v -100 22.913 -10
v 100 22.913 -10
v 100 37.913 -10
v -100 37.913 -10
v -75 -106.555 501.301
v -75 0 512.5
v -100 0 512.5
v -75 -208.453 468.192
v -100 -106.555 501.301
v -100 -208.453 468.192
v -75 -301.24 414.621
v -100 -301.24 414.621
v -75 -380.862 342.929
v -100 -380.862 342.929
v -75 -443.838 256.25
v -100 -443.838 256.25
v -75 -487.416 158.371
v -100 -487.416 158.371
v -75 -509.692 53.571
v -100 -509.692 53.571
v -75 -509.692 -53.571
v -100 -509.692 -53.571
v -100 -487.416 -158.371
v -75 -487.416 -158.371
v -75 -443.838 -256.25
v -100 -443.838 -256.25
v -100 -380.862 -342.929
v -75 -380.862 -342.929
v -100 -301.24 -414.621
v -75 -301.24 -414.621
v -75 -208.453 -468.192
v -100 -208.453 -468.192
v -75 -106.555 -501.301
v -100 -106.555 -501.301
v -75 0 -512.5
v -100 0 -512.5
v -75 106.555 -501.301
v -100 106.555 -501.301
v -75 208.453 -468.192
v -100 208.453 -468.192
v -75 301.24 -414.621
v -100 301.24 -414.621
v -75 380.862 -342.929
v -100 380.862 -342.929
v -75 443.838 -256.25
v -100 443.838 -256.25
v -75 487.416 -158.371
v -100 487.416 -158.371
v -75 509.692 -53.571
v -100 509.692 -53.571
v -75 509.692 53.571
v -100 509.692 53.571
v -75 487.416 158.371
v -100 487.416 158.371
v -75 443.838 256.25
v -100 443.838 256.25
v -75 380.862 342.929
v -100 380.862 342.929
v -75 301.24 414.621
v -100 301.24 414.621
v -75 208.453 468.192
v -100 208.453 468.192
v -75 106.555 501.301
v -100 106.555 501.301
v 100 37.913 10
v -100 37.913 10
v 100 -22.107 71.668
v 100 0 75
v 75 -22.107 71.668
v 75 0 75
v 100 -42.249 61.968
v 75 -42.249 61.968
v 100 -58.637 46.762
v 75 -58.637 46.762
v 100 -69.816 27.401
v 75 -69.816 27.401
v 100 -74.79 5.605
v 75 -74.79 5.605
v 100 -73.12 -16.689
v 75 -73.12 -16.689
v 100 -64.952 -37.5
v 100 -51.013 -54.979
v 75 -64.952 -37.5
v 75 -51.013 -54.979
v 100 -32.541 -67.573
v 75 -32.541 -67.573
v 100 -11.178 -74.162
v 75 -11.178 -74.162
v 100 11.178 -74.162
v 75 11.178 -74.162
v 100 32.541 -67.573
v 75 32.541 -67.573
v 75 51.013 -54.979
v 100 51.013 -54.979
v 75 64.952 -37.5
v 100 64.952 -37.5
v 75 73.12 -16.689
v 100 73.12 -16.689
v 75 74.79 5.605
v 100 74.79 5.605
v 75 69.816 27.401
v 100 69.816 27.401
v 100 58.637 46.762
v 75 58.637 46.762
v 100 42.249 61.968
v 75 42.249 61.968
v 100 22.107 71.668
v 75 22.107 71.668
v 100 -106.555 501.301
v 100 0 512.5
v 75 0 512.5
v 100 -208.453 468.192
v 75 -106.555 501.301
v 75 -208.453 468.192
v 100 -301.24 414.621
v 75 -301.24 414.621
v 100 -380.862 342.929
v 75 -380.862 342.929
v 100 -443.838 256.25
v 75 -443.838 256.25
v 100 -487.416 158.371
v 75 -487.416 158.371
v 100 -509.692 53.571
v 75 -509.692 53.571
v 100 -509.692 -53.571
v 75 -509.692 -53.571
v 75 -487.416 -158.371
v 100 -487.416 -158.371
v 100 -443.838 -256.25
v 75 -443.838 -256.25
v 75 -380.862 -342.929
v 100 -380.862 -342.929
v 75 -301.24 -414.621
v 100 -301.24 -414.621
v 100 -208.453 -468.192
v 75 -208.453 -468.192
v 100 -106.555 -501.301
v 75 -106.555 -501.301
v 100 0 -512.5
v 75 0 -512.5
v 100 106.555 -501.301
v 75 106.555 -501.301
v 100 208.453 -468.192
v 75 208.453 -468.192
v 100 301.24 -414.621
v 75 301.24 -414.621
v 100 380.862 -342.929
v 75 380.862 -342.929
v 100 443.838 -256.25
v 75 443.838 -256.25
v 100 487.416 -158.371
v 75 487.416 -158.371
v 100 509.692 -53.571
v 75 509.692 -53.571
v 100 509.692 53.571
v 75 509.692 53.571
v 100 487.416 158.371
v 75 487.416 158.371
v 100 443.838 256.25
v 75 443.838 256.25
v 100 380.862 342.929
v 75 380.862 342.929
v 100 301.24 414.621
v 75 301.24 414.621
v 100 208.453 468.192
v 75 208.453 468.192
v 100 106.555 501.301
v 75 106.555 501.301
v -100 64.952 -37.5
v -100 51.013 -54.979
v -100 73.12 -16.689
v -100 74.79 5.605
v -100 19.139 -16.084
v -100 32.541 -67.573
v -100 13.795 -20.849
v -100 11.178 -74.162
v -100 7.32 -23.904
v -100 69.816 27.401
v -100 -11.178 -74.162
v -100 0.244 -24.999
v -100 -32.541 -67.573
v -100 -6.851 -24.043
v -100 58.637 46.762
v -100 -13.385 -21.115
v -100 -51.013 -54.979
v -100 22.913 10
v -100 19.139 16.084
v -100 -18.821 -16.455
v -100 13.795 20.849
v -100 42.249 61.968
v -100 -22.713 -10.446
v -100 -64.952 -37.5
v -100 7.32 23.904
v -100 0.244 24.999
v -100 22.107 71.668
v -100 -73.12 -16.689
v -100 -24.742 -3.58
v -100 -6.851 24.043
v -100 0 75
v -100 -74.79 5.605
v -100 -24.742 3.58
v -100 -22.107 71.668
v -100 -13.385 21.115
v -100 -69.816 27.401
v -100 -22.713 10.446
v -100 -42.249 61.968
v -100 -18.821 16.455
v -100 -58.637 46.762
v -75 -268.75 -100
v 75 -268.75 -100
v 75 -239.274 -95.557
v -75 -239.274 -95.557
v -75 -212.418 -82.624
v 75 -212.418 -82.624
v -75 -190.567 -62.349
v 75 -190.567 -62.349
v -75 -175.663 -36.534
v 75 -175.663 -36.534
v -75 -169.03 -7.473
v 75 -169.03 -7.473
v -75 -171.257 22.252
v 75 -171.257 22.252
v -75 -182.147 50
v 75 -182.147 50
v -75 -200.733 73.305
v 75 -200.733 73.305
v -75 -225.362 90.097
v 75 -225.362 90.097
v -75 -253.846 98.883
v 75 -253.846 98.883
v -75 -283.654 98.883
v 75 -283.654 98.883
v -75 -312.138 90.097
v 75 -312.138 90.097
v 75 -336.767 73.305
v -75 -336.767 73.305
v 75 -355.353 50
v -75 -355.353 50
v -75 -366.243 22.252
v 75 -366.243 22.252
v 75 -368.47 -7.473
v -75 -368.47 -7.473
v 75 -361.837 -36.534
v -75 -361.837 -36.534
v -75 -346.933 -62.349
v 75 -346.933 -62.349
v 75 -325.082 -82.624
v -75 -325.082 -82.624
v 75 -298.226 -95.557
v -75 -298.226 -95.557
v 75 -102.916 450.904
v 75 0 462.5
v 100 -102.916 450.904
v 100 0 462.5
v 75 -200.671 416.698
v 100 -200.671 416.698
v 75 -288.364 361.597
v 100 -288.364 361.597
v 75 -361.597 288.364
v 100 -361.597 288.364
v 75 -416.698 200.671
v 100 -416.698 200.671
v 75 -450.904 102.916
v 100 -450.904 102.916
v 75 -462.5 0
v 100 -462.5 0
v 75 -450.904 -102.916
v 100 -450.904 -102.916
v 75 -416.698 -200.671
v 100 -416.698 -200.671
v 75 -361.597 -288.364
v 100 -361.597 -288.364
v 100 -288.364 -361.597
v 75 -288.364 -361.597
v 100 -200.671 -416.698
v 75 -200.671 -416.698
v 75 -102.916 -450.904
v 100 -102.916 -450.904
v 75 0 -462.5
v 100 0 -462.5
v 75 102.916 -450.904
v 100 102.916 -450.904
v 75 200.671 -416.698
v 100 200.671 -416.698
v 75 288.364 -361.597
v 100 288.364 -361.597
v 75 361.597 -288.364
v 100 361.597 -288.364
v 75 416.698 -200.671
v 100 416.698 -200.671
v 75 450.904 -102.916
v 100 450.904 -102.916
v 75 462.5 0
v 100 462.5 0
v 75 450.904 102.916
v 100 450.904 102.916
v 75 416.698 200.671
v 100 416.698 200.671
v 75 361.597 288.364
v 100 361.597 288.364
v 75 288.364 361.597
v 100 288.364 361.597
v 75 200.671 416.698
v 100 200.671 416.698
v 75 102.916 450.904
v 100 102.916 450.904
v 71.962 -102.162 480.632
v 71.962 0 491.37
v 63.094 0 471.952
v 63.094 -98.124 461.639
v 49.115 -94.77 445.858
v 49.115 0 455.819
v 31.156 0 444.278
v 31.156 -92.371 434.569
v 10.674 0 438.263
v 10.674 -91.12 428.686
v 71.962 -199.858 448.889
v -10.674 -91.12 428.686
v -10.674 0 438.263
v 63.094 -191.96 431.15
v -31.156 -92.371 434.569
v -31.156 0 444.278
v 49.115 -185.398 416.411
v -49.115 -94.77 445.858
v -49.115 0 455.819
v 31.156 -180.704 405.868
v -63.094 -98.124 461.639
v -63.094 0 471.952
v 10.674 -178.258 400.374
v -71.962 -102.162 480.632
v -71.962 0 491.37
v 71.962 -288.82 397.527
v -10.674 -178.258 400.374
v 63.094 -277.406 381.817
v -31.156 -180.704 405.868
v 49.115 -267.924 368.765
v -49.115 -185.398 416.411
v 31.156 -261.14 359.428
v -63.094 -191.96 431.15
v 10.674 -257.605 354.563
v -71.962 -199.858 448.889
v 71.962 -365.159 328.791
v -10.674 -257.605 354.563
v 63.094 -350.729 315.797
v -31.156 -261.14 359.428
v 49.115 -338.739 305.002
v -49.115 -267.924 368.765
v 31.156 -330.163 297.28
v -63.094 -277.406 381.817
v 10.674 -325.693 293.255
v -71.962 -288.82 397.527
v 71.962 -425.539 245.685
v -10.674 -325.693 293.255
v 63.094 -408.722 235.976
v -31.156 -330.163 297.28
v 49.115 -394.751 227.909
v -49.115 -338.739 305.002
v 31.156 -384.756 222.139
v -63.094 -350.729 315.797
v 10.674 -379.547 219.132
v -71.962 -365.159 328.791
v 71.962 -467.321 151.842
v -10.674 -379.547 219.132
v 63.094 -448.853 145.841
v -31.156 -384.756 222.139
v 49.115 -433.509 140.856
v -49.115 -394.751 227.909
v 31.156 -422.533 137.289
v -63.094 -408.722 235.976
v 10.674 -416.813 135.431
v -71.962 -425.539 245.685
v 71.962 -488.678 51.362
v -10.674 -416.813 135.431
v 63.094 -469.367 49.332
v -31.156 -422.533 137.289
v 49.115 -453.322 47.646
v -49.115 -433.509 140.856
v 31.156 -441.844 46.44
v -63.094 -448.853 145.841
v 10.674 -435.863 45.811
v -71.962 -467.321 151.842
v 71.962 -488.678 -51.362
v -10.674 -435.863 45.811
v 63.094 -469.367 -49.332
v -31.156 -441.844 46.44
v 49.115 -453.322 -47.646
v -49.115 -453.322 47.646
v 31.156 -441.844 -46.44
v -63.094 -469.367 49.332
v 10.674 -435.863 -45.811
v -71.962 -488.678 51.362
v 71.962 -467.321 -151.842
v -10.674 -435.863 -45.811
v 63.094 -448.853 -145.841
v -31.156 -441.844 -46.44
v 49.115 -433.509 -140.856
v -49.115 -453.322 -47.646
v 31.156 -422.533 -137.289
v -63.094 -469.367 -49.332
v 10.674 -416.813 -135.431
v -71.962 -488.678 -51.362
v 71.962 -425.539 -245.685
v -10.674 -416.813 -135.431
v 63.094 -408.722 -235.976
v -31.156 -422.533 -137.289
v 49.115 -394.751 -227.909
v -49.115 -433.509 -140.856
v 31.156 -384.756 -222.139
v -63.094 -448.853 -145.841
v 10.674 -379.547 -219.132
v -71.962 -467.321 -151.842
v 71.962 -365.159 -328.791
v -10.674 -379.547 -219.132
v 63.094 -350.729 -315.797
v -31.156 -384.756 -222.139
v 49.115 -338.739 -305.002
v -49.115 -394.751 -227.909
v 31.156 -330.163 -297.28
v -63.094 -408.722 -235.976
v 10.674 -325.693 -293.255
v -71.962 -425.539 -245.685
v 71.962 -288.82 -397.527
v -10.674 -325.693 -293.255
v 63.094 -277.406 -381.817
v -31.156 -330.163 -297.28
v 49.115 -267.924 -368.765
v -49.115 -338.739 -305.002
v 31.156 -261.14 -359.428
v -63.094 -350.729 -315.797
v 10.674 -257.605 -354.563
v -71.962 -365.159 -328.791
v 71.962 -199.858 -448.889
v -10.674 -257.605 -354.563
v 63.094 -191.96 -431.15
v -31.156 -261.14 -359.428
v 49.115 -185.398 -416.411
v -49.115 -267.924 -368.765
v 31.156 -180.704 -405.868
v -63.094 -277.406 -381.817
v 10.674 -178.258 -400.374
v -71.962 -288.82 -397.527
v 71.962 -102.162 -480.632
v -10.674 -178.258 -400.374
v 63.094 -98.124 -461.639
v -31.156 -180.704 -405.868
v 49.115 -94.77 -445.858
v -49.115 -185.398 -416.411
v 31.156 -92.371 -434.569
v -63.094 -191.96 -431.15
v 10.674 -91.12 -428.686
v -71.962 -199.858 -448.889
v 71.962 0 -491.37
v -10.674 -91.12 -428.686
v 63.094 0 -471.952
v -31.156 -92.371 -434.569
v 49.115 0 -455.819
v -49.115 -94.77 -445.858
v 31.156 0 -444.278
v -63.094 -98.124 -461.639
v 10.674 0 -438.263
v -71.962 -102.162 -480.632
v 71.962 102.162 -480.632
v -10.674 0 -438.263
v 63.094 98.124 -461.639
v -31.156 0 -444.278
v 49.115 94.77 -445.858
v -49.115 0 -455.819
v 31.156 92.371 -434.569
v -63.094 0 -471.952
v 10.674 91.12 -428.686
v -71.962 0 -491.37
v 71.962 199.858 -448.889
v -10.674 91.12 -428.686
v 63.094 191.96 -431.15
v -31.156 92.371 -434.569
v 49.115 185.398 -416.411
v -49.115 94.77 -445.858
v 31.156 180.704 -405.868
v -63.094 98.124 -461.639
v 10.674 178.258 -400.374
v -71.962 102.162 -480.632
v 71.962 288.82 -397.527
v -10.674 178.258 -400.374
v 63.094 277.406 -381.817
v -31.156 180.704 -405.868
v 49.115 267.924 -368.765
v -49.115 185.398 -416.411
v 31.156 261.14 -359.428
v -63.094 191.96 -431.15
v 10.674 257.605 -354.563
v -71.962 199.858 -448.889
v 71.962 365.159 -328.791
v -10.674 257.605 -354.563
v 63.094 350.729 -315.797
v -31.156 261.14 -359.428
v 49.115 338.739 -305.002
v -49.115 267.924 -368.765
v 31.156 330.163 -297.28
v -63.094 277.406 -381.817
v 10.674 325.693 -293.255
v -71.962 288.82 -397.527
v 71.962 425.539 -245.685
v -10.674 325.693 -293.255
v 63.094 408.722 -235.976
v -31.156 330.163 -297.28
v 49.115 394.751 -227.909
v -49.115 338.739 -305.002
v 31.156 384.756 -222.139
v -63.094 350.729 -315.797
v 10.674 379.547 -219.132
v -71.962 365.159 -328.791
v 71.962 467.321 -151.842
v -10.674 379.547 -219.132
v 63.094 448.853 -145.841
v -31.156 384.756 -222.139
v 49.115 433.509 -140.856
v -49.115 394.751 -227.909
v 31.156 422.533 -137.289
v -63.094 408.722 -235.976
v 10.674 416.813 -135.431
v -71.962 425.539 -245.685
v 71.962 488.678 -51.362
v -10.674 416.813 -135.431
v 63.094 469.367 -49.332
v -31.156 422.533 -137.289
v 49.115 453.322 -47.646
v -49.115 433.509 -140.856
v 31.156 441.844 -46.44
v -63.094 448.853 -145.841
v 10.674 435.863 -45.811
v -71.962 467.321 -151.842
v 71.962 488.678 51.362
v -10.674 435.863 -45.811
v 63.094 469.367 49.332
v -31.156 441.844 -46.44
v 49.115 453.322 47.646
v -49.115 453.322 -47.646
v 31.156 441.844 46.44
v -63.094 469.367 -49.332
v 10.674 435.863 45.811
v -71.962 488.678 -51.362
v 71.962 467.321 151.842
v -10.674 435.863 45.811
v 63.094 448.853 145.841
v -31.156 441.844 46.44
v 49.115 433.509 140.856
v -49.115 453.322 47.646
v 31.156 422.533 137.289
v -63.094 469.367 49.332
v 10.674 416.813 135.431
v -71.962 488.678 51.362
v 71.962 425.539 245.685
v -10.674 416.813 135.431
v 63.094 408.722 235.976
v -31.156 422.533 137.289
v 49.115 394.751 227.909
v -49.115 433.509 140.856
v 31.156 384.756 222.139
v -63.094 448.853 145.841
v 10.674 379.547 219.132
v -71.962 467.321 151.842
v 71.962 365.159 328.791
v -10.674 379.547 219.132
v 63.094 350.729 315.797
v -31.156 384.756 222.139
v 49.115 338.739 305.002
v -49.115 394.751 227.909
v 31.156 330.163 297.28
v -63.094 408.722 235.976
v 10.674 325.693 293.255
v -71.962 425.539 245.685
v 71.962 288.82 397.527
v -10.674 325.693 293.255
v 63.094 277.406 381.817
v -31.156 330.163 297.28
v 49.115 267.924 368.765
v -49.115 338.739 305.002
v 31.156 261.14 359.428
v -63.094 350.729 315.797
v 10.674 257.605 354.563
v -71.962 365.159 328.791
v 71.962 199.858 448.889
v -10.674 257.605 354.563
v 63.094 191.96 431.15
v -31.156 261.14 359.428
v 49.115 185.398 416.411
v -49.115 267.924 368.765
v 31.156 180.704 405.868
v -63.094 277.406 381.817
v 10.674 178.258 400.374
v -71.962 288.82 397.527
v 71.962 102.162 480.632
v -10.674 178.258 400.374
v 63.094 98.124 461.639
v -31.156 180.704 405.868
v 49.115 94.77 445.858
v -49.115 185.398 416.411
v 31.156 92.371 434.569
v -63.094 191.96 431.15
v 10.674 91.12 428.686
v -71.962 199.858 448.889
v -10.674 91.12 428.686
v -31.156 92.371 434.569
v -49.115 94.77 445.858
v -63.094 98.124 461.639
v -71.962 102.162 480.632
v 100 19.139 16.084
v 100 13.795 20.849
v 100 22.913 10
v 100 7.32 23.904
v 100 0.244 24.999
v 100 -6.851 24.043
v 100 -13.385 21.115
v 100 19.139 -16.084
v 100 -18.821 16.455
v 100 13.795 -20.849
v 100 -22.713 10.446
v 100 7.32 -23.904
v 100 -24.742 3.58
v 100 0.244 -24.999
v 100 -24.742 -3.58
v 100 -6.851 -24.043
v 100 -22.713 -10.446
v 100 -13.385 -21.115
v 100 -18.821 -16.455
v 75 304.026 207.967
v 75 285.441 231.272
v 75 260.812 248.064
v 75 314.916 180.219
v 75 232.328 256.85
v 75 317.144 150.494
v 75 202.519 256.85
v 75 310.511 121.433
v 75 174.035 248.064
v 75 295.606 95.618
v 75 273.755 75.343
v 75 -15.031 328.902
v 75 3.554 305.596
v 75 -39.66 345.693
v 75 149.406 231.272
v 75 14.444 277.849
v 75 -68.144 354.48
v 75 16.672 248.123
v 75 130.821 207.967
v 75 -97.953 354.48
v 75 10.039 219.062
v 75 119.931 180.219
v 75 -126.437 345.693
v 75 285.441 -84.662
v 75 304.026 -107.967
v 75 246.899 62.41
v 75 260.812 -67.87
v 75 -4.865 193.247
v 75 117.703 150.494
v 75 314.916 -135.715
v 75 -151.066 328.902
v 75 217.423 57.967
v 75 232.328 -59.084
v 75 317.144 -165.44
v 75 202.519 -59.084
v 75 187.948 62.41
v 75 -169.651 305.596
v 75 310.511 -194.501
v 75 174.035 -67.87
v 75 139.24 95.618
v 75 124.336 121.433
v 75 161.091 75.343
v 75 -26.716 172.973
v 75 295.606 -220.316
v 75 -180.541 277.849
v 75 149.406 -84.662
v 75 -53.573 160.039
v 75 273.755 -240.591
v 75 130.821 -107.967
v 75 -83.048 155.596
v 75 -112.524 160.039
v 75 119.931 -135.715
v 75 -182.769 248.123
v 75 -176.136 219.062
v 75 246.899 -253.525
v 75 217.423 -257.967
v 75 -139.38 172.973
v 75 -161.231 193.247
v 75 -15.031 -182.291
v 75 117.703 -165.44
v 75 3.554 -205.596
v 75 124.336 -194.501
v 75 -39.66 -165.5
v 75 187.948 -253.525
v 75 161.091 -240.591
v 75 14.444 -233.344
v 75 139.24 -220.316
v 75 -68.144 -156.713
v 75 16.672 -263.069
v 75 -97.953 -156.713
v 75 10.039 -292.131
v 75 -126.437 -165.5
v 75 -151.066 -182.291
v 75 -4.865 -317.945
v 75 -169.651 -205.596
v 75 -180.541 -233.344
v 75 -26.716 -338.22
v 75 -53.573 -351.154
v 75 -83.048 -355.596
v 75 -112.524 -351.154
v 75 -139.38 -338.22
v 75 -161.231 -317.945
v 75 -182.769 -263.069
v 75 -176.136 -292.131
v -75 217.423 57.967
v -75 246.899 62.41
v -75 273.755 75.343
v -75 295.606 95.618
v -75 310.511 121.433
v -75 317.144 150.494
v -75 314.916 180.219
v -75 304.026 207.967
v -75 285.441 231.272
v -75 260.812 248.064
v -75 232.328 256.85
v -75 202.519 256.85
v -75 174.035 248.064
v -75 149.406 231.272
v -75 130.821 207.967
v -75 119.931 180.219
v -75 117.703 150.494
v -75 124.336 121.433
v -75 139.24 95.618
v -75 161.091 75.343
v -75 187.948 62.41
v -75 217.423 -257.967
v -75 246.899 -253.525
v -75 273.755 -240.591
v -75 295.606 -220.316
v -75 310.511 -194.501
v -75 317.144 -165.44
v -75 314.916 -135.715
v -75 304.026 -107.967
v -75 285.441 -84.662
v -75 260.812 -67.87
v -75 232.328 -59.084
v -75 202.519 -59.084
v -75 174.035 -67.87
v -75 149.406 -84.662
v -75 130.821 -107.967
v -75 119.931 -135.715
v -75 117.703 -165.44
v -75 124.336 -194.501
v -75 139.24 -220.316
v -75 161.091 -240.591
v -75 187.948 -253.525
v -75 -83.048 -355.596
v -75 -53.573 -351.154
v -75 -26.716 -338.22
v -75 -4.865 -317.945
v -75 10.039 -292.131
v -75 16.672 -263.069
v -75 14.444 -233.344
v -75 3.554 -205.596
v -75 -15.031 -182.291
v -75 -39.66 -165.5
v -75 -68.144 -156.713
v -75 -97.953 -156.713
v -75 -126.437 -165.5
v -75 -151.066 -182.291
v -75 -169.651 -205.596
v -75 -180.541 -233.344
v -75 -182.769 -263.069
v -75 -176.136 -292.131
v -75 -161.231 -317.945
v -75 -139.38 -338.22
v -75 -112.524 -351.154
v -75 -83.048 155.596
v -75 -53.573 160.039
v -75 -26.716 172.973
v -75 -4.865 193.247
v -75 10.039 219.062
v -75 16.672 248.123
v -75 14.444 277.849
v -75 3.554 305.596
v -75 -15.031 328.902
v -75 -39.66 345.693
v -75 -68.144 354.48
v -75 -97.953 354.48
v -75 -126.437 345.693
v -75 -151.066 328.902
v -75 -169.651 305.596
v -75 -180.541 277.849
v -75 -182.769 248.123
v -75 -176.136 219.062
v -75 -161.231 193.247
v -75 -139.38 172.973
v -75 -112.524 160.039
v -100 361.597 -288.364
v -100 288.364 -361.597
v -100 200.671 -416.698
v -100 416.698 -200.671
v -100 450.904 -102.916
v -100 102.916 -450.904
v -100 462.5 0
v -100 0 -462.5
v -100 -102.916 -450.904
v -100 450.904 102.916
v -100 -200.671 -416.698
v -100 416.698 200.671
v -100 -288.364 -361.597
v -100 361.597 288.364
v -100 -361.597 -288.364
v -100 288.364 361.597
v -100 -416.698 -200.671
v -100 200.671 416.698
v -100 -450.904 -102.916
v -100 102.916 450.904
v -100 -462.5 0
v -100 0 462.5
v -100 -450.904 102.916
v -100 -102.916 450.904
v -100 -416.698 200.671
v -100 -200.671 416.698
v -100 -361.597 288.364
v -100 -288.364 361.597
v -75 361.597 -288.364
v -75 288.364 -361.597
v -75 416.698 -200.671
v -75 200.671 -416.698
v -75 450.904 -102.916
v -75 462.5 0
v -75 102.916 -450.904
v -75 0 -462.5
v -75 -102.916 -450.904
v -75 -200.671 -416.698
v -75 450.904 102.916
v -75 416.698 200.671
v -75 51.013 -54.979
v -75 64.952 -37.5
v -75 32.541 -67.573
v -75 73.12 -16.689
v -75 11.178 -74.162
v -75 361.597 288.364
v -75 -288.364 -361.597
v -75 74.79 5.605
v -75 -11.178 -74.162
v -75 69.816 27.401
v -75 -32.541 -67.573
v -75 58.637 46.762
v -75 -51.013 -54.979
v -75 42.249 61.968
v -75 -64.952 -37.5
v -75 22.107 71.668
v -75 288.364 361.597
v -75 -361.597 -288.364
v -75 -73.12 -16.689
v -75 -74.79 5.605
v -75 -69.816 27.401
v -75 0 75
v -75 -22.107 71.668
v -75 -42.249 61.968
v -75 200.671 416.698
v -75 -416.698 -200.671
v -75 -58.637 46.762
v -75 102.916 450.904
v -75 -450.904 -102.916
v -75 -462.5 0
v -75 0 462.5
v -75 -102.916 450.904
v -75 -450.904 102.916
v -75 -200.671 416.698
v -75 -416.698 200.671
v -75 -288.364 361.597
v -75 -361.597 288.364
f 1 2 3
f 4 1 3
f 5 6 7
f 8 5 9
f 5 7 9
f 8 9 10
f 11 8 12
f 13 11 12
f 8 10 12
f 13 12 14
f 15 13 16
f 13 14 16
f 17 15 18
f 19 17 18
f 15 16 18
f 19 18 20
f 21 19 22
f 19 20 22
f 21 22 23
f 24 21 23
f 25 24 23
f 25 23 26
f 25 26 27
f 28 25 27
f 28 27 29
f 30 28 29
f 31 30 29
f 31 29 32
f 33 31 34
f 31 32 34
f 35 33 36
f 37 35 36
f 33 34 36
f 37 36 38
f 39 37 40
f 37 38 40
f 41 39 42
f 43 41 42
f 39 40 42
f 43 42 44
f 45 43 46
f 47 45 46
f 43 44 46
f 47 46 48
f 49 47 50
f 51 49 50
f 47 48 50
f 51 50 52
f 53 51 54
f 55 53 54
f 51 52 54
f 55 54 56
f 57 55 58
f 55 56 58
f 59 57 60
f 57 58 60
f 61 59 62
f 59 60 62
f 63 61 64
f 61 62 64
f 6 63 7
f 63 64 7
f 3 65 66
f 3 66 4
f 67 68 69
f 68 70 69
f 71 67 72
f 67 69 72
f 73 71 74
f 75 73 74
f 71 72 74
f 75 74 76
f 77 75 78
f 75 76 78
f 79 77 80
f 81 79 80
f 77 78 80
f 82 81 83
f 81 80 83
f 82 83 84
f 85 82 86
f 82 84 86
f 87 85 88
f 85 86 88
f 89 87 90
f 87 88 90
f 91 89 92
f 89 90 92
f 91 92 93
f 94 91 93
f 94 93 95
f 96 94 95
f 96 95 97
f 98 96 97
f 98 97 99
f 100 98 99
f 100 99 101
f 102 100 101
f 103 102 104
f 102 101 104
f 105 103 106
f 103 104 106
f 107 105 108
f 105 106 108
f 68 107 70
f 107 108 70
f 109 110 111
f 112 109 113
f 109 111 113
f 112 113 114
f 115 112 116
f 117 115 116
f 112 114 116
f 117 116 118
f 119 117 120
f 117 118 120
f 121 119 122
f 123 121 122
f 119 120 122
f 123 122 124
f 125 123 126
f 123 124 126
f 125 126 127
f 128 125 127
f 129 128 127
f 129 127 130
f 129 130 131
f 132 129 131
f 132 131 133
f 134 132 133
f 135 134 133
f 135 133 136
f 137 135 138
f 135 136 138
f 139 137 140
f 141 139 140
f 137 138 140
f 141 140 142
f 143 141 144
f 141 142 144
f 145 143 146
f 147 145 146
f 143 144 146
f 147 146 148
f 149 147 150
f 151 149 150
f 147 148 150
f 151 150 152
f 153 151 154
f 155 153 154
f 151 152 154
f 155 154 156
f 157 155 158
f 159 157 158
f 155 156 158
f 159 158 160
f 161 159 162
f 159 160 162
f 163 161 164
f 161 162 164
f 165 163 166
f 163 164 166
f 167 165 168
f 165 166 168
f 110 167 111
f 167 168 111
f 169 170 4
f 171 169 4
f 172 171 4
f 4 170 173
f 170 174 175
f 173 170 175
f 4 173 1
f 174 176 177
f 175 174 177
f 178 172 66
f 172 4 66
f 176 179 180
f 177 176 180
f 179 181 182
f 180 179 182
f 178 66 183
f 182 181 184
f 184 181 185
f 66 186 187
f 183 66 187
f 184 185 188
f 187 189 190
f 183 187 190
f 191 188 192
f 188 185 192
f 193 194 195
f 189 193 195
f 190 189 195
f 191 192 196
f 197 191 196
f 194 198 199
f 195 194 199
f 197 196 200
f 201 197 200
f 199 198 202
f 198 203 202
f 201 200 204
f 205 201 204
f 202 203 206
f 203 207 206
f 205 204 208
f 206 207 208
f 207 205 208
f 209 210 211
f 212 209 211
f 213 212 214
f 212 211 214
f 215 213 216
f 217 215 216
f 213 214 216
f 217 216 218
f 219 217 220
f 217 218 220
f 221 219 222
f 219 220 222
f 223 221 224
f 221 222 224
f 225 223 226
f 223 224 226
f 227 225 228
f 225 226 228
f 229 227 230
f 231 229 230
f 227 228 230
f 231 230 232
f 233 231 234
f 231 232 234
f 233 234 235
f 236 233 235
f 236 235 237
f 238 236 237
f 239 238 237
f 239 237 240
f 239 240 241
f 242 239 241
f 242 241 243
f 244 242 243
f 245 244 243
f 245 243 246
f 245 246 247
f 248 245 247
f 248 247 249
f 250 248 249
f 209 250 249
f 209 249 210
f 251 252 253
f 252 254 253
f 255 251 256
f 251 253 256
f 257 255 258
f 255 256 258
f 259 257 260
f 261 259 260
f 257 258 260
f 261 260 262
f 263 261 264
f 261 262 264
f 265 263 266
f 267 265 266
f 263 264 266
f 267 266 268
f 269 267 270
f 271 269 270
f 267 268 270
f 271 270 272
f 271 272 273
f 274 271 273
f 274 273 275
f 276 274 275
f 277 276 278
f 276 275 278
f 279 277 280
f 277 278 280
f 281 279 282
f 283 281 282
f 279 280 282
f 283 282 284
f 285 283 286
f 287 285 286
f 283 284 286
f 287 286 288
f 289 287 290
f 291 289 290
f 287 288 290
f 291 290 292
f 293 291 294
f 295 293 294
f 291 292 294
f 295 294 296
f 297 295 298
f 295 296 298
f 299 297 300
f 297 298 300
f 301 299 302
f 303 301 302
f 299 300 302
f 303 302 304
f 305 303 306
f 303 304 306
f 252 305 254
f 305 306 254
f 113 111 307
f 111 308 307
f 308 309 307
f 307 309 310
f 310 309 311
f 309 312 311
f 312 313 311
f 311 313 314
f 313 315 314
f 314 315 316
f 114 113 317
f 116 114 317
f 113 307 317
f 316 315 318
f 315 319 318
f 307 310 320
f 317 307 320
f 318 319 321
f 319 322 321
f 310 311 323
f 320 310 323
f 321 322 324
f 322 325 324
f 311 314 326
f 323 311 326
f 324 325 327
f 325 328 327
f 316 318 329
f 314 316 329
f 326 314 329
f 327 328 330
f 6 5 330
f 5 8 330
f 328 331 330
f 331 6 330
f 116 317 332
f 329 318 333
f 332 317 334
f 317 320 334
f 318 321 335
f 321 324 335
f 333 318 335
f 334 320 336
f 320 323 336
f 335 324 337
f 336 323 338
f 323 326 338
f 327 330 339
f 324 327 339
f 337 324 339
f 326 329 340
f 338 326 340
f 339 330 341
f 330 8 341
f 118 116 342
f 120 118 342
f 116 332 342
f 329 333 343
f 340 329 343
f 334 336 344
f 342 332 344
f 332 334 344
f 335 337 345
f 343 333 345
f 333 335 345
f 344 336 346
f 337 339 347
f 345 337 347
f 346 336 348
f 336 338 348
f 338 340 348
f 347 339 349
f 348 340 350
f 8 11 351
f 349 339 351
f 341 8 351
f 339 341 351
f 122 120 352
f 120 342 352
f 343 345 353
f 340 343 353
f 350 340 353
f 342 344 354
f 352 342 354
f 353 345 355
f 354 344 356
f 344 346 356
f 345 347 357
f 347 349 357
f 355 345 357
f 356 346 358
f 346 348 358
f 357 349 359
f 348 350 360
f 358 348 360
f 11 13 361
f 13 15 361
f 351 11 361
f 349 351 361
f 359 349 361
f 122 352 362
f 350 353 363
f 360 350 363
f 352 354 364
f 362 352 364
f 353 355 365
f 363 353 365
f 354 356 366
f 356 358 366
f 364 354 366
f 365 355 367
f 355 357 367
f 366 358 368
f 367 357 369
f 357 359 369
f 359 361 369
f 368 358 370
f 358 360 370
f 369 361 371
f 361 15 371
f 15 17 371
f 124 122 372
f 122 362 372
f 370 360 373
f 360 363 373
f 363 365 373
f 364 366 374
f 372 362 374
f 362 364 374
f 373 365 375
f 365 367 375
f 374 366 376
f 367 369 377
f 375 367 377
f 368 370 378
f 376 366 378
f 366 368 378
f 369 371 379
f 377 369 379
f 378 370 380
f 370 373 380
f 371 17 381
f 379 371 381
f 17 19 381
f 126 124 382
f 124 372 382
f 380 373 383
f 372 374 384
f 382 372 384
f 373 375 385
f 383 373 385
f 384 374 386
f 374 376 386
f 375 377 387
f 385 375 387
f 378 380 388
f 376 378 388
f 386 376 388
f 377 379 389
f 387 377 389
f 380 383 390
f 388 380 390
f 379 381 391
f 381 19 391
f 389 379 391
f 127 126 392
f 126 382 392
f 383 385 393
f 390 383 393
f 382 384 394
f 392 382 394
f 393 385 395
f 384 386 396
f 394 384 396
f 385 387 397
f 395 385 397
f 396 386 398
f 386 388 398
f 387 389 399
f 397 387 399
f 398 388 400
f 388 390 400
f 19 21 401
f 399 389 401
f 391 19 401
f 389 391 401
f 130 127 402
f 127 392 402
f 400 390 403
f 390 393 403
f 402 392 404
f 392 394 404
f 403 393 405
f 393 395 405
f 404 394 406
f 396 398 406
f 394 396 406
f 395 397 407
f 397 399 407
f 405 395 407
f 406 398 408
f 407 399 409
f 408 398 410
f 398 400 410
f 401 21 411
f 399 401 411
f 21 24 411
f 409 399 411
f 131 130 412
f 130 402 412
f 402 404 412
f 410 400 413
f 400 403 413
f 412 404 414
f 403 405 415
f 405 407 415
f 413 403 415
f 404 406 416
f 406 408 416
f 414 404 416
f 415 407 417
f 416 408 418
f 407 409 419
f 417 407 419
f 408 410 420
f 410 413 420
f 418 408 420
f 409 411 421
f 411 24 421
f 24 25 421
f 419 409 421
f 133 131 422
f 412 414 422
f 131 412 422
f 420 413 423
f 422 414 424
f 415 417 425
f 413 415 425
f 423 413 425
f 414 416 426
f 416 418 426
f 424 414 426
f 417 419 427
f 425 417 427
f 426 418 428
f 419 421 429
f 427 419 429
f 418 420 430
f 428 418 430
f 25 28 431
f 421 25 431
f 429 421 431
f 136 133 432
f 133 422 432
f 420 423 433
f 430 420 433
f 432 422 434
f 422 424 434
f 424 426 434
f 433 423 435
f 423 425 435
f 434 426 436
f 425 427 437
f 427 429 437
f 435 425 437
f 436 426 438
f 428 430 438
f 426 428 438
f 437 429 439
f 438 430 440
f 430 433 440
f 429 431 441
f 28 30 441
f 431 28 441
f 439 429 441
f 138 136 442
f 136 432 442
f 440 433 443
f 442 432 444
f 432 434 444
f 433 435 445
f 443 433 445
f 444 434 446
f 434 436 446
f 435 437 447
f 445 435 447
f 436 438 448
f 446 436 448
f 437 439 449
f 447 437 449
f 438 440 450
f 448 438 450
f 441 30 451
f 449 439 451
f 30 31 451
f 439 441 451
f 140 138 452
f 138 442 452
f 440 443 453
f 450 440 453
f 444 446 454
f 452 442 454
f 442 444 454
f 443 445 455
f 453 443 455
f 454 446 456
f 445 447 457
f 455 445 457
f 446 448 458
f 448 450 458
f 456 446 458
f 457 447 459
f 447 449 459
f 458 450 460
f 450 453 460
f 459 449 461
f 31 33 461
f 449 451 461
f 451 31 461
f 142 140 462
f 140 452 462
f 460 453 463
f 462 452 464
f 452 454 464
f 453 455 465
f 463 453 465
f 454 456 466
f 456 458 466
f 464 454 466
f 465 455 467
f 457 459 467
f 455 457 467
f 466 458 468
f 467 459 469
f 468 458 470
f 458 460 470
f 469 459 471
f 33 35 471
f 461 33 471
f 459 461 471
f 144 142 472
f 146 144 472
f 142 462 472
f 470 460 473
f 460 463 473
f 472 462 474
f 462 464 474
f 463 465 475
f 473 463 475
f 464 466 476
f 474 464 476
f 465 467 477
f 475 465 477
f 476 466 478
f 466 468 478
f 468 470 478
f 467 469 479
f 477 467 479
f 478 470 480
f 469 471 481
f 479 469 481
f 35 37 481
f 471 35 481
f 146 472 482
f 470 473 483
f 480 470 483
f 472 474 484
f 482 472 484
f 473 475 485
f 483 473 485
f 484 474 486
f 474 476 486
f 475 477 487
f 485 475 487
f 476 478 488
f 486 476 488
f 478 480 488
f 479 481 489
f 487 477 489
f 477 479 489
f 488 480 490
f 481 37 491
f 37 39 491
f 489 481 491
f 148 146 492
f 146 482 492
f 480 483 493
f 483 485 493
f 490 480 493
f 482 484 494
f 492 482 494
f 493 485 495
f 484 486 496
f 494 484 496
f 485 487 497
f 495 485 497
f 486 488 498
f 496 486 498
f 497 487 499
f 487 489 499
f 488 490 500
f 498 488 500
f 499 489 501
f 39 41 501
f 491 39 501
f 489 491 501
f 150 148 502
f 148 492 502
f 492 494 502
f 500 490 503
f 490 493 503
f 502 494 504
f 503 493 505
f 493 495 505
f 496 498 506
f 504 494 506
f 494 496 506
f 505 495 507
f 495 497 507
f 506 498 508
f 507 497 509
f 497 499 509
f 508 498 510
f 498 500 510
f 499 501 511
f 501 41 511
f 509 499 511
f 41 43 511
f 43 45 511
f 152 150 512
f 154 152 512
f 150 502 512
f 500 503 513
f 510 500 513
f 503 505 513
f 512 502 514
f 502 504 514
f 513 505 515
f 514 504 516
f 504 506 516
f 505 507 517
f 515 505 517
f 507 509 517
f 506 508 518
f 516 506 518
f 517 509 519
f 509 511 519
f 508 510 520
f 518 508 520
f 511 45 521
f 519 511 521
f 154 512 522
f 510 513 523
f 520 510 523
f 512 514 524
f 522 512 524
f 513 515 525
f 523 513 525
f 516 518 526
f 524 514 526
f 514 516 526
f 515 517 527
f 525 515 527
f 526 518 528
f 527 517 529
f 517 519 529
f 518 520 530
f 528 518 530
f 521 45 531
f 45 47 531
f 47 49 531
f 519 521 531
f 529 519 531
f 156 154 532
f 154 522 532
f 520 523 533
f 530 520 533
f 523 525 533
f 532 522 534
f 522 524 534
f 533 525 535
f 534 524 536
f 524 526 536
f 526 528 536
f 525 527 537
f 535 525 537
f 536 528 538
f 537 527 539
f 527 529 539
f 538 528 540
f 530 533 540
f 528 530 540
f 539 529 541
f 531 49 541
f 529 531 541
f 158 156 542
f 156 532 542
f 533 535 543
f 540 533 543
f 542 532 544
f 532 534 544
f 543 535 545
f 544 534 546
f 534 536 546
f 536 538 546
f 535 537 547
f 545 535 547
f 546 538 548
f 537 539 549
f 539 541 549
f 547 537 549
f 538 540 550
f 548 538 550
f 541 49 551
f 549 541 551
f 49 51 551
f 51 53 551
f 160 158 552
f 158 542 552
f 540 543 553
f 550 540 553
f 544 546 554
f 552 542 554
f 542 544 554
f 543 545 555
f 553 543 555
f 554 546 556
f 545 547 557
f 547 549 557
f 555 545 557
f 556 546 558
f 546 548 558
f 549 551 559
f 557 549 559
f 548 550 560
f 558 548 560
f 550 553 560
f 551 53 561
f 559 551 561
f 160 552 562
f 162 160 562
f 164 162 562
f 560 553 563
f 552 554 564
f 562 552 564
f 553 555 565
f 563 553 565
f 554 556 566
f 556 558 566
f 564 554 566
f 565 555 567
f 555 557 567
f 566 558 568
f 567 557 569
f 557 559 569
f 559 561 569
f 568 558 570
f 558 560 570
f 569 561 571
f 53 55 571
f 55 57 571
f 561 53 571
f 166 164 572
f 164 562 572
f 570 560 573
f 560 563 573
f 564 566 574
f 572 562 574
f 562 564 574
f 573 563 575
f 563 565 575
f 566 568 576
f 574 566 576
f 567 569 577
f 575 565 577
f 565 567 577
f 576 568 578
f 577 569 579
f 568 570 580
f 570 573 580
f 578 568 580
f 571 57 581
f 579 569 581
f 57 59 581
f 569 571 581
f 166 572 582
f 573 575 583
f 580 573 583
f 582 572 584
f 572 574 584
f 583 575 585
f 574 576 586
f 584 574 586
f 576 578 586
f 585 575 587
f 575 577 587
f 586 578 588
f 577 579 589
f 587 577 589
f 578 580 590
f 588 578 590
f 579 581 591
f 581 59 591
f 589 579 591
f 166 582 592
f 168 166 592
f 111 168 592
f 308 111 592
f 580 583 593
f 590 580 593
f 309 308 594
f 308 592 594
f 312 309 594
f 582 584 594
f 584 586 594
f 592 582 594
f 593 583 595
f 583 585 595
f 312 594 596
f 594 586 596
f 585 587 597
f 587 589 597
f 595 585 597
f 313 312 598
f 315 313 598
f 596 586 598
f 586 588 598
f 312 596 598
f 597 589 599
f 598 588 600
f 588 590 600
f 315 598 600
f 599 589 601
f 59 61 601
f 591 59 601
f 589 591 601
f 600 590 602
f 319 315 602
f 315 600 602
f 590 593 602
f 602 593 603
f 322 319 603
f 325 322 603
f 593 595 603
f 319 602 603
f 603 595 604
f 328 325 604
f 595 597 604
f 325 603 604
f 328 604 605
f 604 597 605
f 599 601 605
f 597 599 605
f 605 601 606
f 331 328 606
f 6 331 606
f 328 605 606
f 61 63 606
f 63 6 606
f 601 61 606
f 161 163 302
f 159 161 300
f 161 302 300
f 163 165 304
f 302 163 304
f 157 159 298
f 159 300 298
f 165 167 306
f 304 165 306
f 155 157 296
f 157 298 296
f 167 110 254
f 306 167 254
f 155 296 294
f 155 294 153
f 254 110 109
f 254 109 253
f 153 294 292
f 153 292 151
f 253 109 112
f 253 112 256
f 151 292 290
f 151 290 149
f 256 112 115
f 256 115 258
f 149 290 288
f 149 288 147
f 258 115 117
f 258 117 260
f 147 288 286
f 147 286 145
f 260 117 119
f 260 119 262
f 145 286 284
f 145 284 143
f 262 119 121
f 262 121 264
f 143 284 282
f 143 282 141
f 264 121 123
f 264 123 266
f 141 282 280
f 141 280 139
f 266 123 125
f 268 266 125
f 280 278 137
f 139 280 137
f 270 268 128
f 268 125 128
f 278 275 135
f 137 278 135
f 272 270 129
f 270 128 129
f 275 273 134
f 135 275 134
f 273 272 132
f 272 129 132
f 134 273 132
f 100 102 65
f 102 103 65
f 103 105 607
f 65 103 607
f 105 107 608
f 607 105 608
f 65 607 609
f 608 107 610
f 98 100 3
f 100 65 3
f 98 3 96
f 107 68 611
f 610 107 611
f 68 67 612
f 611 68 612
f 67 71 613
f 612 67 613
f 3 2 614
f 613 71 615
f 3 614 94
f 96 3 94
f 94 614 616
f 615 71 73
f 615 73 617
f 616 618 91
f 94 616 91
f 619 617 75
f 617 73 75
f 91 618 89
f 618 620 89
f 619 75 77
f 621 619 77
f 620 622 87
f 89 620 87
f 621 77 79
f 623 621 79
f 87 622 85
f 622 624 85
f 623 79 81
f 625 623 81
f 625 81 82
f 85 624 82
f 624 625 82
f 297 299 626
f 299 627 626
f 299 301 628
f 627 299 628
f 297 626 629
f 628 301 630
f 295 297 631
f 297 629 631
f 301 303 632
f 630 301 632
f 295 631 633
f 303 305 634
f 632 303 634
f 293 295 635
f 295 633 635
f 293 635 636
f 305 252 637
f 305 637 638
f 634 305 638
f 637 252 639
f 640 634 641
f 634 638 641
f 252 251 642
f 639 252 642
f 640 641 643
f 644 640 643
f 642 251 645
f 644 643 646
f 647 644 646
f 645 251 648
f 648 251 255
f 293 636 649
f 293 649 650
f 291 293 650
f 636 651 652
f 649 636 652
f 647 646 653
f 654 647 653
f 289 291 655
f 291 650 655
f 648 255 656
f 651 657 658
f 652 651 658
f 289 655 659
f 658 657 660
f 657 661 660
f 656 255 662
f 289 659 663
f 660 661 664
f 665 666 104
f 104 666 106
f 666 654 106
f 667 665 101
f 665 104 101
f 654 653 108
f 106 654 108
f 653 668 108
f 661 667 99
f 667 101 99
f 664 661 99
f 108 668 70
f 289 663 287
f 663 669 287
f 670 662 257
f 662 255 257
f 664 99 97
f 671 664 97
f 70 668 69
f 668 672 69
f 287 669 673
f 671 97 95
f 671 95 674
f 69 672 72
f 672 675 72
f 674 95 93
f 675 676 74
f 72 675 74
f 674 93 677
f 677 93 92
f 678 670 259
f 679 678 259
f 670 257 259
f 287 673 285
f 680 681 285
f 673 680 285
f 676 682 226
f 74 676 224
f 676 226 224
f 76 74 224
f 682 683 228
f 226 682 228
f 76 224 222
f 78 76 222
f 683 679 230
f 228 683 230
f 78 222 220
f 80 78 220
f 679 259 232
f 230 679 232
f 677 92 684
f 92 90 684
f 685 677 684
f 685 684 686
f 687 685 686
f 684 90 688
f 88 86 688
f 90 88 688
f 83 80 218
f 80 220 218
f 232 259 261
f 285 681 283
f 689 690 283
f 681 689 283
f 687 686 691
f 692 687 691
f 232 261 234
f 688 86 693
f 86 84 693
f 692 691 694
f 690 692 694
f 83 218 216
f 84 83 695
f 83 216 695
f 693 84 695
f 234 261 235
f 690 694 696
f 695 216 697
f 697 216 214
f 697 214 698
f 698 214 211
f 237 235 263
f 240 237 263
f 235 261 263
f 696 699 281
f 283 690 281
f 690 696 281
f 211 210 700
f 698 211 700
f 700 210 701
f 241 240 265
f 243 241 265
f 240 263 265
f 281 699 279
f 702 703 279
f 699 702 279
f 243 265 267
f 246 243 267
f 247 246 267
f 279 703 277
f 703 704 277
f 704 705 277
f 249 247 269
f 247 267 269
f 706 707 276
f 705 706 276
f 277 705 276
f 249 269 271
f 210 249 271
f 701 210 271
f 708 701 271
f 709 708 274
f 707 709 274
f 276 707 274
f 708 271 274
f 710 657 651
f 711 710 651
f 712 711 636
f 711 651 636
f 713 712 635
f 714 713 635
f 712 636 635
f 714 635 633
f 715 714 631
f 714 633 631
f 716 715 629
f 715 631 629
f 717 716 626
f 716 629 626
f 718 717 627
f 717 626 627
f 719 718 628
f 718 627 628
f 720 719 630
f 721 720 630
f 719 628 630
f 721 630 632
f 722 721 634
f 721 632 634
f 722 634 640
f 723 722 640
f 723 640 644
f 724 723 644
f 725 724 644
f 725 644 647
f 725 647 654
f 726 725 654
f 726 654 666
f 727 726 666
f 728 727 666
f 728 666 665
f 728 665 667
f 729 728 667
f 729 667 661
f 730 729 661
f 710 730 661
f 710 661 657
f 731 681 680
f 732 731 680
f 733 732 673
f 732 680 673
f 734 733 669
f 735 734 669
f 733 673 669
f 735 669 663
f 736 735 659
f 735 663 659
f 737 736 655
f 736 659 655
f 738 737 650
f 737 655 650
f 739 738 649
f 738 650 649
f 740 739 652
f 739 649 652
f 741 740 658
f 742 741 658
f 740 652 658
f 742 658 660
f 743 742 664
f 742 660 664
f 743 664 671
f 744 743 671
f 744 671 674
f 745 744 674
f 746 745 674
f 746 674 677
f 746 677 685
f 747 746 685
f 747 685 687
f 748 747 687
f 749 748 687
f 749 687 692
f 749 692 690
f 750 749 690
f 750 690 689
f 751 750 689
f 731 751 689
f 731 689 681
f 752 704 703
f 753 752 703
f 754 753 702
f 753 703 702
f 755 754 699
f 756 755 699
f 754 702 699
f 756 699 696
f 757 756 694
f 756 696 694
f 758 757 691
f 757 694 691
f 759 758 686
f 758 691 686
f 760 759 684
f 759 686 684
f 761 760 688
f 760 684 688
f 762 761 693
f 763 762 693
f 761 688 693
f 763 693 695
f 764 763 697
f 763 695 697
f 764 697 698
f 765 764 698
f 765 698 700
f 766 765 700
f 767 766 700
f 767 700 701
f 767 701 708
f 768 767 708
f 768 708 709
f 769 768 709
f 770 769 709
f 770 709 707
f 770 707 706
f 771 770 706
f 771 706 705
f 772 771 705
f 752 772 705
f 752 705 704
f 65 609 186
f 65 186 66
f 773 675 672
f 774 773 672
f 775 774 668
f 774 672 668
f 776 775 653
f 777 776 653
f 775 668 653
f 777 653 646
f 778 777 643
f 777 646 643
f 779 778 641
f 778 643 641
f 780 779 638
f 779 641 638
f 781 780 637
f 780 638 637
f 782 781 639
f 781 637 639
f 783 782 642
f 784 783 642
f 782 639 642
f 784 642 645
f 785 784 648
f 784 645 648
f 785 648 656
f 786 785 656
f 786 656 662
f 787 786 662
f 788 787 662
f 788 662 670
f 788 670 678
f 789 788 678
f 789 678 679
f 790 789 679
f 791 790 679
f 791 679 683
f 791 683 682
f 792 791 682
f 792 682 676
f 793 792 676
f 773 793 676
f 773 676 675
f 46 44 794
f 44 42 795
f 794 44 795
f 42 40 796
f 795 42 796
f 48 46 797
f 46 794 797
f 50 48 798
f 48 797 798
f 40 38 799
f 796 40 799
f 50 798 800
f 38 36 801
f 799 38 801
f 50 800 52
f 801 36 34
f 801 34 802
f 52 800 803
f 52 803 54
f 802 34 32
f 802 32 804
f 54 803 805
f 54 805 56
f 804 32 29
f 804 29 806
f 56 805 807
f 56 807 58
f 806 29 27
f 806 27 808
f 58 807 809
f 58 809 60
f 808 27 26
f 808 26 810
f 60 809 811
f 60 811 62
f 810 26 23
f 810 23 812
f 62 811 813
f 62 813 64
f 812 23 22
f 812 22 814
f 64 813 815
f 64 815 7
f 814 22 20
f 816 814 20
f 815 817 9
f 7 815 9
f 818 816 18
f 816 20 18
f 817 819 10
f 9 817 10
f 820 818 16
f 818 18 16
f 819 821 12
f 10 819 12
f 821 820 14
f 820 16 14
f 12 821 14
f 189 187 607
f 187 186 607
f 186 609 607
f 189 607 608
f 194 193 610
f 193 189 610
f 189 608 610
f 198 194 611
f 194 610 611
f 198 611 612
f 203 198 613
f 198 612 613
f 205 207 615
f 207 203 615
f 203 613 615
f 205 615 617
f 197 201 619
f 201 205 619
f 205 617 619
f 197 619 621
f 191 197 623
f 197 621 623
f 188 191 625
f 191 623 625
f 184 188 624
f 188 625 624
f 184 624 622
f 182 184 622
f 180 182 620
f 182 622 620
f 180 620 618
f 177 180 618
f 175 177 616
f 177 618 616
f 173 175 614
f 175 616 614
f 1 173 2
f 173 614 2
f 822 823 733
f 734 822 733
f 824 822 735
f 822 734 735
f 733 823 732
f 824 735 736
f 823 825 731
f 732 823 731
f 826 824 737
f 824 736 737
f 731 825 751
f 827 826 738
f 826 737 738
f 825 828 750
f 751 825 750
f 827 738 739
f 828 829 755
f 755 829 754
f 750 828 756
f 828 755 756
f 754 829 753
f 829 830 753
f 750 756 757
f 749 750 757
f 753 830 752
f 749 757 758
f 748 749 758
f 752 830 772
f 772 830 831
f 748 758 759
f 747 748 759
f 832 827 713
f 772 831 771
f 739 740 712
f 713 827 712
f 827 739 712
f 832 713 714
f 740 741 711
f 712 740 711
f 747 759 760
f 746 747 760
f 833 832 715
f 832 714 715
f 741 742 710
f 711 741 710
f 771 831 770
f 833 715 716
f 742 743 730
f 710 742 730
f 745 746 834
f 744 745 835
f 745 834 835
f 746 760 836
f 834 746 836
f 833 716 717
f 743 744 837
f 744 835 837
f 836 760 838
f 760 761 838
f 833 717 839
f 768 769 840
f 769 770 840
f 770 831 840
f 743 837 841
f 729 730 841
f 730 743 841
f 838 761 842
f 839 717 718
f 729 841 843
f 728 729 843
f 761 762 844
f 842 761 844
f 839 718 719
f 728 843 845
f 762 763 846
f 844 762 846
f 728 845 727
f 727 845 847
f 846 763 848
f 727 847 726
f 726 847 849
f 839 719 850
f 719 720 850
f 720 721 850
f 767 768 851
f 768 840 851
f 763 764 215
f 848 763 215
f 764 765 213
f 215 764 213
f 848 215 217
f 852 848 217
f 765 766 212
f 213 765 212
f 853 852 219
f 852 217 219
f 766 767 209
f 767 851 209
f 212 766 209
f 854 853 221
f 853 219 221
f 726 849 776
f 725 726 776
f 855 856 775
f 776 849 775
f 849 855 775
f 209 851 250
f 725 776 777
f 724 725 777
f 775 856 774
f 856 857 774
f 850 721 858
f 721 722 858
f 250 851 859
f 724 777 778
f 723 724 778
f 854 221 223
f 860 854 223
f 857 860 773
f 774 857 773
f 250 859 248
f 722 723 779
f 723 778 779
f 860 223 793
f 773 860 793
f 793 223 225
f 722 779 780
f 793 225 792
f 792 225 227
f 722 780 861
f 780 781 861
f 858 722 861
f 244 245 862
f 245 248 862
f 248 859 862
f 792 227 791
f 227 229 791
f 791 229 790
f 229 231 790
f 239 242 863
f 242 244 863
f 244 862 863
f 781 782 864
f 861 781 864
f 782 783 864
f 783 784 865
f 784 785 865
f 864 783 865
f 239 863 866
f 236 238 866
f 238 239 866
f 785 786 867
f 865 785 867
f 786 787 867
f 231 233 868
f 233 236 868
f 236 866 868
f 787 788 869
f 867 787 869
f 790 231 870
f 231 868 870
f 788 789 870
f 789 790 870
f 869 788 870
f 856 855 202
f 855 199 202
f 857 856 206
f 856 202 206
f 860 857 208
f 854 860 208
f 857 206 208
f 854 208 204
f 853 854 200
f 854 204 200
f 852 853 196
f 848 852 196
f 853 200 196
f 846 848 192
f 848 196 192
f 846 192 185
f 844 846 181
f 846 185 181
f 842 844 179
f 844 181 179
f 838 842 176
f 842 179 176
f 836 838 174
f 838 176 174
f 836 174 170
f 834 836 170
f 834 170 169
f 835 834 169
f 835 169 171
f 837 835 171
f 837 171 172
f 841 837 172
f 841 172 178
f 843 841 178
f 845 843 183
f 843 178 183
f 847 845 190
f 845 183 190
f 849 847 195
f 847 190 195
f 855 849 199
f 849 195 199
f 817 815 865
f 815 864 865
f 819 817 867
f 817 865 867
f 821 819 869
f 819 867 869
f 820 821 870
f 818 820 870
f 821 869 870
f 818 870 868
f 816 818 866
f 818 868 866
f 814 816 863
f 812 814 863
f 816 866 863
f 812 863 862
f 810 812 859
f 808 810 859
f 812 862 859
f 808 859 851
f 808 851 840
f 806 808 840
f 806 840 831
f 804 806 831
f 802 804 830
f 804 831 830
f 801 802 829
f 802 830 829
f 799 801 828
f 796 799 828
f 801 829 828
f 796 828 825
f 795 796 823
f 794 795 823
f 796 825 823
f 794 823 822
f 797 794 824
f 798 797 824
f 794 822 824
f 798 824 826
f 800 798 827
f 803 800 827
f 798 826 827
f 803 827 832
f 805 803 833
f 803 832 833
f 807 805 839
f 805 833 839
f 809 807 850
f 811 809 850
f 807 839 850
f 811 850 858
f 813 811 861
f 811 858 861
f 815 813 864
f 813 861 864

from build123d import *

# Parameters (mm, degrees)
SKETCH2_W          = 20
SKETCH2_H          = 15
CUT_EXTRUDE1_DEPTH = 200
SKETCH3_R          = 100
CUT_EXTRUDE2_DEPTH = 200


with BuildPart() as part:
    # Sketch1 → Revolve2 (revolve)
    with BuildSketch(Plane.XY, mode=Mode.PRIVATE) as revolve2_sk:
        with BuildLine():
            Line((-75, 25), (75, 25))
            Line((75, 25), (100, 25))
            Line((100, 25), (100, 75))
            Line((100, 75), (75, 75))
            Line((75, 75), (75, 462.5))
            Line((75, 462.5), (100, 462.5))
            Line((100, 462.5), (100, 512.5))
            Line((100, 512.5), (75, 512.5))
            ThreePointArc((75, 512.5), (0, 437.5), (-75, 512.5))
            Line((-75, 512.5), (-100, 512.5))
            Line((-100, 512.5), (-100, 462.5))
            Line((-100, 462.5), (-75, 462.5))
            Line((-75, 462.5), (-75, 75))
            Line((-75, 75), (-100, 75))
            Line((-100, 75), (-100, 25))
            Line((-100, 25), (-75, 25))
        make_face()
    revolve(revolve2_sk.sketch.rotate(Axis((-60.76079066, 0, 0), (1, 0, 0)), 90), axis=Axis((-60.76079066, 0, 0), (1, 0, 0)))

    # Sketch2 → Cut-Extrude1 (cut)
    with BuildSketch(Plane(origin=(100, 0, 0), x_dir=(0, 0, -1), z_dir=(1, 0, 0))):
        with Locations((0, 30.412878475)):
            Rectangle(SKETCH2_W, SKETCH2_H)
    extrude(amount=-CUT_EXTRUDE1_DEPTH, mode=Mode.SUBTRACT)

    # Sketch3 → Cut-Extrude2 (cut)
    with BuildSketch(Plane(origin=(75, 0, 0), x_dir=(0, 0, -1), z_dir=(1, 0, 0))):
        with Locations((0, -268.75)):
            Circle(SKETCH3_R)
        with Locations((-255.596438754, -83.048317238)):
            Circle(SKETCH3_R)
        with Locations((-157.967286554, 217.423317238)):
            Circle(SKETCH3_R)
        with Locations((157.967286554, 217.423317238)):
            Circle(SKETCH3_R)
        with Locations((255.596438754, -83.048317238)):
            Circle(SKETCH3_R)
    extrude(amount=-CUT_EXTRUDE2_DEPTH, mode=Mode.SUBTRACT)


solid = part.part
